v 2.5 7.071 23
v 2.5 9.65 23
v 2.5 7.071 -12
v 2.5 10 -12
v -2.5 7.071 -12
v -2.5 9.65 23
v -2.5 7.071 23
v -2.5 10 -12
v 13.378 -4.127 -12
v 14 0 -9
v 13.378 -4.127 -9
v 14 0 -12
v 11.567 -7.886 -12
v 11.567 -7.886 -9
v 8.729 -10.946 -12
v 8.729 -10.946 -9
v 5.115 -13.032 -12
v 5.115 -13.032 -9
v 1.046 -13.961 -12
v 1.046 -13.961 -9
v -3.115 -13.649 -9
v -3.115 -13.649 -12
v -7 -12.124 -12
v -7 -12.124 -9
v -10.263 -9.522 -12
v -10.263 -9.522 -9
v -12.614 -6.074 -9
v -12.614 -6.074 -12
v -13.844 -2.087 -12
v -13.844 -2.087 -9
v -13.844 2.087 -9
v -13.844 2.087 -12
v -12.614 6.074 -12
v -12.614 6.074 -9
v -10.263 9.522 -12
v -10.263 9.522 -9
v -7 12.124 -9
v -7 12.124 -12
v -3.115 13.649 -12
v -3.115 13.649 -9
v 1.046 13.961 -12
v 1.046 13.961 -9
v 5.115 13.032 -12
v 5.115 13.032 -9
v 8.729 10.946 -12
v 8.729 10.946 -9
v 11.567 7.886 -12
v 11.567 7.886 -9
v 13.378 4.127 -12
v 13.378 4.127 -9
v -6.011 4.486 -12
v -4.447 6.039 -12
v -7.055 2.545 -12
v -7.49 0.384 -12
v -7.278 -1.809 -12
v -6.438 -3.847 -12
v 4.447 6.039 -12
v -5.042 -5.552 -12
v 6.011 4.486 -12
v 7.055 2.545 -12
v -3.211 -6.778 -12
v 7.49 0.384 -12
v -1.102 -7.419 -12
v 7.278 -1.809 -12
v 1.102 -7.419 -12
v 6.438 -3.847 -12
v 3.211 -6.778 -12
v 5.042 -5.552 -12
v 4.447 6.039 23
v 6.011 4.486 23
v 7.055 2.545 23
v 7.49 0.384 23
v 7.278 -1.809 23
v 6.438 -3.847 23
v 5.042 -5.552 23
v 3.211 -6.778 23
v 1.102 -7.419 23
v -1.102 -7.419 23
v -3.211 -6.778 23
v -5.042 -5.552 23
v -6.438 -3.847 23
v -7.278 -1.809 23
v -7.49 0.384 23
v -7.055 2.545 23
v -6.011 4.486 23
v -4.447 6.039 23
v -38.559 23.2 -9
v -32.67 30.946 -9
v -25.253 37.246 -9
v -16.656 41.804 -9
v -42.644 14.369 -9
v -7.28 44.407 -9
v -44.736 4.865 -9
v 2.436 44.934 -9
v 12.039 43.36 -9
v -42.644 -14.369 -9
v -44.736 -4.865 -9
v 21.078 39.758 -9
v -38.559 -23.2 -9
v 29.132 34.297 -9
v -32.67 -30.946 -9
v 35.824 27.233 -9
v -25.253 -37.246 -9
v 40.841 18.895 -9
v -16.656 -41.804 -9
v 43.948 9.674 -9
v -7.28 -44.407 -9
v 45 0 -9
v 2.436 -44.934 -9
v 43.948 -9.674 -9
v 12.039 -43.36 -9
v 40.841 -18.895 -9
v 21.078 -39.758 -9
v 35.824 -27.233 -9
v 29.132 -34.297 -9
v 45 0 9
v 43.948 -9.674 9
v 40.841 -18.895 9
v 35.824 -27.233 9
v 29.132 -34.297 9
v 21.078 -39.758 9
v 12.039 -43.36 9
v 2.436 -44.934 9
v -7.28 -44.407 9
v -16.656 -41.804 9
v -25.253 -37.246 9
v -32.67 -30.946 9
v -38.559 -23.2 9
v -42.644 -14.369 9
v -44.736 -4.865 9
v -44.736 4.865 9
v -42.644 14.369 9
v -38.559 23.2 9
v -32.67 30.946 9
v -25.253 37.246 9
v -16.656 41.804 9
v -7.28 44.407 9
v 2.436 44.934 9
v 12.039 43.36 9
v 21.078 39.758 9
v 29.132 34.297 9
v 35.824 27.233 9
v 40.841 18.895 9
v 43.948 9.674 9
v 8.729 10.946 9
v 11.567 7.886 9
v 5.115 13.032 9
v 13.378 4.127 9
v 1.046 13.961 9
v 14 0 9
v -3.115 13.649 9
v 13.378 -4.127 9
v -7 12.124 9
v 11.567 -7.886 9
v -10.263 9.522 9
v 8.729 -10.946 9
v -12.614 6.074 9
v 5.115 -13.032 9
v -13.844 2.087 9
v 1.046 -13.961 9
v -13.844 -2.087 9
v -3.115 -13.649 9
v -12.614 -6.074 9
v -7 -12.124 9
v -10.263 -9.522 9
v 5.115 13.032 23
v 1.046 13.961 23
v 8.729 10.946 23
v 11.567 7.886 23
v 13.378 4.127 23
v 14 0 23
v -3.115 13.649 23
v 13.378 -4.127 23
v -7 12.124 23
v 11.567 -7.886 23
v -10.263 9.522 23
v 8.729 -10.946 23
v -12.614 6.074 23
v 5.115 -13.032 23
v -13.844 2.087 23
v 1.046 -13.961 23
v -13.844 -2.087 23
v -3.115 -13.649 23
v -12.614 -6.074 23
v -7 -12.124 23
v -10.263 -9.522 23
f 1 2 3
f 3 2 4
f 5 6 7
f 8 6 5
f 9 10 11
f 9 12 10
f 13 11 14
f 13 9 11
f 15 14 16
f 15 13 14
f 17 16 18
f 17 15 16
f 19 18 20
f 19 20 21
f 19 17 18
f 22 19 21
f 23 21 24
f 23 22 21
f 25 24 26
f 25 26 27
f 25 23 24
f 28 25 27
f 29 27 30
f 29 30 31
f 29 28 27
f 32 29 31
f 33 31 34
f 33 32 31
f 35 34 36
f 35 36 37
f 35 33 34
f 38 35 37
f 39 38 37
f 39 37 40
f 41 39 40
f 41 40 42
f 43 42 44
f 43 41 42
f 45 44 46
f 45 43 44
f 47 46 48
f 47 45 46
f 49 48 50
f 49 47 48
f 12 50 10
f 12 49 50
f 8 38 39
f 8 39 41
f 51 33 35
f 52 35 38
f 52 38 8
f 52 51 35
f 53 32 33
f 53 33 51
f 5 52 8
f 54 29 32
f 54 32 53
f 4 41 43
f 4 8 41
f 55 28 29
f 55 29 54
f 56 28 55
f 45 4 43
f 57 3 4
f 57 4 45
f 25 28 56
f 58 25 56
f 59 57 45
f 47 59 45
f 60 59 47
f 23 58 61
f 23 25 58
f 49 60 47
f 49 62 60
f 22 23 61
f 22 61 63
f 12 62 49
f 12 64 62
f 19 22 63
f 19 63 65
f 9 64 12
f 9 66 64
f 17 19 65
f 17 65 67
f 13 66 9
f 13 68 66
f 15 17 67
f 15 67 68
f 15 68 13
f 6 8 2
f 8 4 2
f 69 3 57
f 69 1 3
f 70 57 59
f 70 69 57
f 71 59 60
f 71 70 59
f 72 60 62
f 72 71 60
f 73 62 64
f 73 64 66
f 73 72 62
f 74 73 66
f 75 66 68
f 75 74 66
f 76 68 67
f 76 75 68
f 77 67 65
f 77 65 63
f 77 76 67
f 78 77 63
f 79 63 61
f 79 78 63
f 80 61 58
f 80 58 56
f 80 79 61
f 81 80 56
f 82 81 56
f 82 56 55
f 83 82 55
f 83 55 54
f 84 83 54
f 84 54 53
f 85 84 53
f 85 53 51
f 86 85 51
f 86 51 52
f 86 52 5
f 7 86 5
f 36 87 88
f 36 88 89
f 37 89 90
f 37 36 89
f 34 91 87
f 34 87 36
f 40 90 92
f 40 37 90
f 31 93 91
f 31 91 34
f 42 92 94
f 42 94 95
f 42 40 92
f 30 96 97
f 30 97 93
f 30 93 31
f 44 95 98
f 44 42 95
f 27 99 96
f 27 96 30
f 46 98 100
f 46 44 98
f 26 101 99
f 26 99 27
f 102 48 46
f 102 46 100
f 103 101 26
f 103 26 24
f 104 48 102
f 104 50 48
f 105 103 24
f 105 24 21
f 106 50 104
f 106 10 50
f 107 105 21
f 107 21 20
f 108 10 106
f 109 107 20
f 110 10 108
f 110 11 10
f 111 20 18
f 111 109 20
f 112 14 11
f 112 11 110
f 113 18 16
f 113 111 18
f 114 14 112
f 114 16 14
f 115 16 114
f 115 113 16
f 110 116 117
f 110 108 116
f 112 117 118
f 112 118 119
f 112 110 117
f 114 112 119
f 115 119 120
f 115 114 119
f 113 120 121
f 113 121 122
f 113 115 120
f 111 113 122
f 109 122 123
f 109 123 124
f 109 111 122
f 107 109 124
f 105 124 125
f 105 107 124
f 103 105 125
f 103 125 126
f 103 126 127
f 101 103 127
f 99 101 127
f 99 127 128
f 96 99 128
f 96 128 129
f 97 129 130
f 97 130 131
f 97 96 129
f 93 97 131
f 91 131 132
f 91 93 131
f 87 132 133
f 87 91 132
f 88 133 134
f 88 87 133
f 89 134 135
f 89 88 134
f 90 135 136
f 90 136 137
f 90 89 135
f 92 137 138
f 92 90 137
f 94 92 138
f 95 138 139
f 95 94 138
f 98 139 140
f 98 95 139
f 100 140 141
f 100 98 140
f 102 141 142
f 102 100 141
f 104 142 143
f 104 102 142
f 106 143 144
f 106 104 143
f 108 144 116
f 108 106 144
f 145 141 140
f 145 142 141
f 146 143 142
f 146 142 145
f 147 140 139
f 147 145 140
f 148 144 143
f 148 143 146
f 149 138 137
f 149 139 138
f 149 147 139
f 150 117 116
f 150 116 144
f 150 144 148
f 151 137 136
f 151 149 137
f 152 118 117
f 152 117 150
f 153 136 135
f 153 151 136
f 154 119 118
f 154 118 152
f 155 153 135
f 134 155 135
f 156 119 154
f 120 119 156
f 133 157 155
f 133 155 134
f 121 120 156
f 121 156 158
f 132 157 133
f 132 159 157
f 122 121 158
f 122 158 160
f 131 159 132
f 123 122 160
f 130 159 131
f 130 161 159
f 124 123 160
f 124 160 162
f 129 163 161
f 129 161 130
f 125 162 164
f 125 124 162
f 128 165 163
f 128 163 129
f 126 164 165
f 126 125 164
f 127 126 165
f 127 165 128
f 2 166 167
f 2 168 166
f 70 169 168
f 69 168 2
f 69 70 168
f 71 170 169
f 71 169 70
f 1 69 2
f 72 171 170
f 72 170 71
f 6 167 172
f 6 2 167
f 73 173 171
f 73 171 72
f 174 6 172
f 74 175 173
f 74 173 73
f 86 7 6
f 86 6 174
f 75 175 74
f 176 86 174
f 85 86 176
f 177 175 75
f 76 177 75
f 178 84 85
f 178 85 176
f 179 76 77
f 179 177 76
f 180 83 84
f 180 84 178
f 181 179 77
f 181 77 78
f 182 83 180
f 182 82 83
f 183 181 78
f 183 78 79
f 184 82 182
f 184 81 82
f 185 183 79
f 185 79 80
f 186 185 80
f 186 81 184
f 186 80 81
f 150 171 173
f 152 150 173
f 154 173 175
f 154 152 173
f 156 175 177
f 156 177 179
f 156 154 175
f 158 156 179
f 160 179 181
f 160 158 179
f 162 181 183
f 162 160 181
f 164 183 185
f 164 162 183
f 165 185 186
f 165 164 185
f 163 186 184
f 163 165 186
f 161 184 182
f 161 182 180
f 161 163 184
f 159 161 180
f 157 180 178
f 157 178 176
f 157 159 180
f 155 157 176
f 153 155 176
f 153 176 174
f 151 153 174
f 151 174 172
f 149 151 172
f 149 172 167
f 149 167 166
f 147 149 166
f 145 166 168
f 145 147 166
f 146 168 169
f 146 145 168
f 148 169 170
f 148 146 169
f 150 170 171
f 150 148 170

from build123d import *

# Parameters (mm, degrees)
CUT_EXTRUDE1_DEPTH = 2.5


with BuildPart() as part:
    # Sketch1 → Revolve1 (revolve)
    with BuildSketch(Plane(origin=(0, 0, 0), x_dir=(0, 0, -1), z_dir=(1, 0, 0)), mode=Mode.PRIVATE) as revolve1_sk:
        Polygon((-23, 7.5), (-23, 14), (-9, 14), (-9, 45), (9, 45), (9, 14), (12, 14), (12, 7.5), align=None)
    revolve(revolve1_sk.sketch.rotate(Axis((0, 0, 42.784), (0, 0, -1)), 90), axis=Axis((0, 0, 42.784), (0, 0, -1)))

    # Sketch2 → Cut-Extrude1 (cut, symmetric)
    with BuildSketch(Plane(origin=(0, 0, 0), x_dir=(0, 0, -1), z_dir=(1, 0, 0))):
        Polygon((-23, 9.65), (-23, 5), (12, 5), (12, 10), align=None)
    extrude(amount=CUT_EXTRUDE1_DEPTH, both=True, mode=Mode.SUBTRACT)


solid = part.part
